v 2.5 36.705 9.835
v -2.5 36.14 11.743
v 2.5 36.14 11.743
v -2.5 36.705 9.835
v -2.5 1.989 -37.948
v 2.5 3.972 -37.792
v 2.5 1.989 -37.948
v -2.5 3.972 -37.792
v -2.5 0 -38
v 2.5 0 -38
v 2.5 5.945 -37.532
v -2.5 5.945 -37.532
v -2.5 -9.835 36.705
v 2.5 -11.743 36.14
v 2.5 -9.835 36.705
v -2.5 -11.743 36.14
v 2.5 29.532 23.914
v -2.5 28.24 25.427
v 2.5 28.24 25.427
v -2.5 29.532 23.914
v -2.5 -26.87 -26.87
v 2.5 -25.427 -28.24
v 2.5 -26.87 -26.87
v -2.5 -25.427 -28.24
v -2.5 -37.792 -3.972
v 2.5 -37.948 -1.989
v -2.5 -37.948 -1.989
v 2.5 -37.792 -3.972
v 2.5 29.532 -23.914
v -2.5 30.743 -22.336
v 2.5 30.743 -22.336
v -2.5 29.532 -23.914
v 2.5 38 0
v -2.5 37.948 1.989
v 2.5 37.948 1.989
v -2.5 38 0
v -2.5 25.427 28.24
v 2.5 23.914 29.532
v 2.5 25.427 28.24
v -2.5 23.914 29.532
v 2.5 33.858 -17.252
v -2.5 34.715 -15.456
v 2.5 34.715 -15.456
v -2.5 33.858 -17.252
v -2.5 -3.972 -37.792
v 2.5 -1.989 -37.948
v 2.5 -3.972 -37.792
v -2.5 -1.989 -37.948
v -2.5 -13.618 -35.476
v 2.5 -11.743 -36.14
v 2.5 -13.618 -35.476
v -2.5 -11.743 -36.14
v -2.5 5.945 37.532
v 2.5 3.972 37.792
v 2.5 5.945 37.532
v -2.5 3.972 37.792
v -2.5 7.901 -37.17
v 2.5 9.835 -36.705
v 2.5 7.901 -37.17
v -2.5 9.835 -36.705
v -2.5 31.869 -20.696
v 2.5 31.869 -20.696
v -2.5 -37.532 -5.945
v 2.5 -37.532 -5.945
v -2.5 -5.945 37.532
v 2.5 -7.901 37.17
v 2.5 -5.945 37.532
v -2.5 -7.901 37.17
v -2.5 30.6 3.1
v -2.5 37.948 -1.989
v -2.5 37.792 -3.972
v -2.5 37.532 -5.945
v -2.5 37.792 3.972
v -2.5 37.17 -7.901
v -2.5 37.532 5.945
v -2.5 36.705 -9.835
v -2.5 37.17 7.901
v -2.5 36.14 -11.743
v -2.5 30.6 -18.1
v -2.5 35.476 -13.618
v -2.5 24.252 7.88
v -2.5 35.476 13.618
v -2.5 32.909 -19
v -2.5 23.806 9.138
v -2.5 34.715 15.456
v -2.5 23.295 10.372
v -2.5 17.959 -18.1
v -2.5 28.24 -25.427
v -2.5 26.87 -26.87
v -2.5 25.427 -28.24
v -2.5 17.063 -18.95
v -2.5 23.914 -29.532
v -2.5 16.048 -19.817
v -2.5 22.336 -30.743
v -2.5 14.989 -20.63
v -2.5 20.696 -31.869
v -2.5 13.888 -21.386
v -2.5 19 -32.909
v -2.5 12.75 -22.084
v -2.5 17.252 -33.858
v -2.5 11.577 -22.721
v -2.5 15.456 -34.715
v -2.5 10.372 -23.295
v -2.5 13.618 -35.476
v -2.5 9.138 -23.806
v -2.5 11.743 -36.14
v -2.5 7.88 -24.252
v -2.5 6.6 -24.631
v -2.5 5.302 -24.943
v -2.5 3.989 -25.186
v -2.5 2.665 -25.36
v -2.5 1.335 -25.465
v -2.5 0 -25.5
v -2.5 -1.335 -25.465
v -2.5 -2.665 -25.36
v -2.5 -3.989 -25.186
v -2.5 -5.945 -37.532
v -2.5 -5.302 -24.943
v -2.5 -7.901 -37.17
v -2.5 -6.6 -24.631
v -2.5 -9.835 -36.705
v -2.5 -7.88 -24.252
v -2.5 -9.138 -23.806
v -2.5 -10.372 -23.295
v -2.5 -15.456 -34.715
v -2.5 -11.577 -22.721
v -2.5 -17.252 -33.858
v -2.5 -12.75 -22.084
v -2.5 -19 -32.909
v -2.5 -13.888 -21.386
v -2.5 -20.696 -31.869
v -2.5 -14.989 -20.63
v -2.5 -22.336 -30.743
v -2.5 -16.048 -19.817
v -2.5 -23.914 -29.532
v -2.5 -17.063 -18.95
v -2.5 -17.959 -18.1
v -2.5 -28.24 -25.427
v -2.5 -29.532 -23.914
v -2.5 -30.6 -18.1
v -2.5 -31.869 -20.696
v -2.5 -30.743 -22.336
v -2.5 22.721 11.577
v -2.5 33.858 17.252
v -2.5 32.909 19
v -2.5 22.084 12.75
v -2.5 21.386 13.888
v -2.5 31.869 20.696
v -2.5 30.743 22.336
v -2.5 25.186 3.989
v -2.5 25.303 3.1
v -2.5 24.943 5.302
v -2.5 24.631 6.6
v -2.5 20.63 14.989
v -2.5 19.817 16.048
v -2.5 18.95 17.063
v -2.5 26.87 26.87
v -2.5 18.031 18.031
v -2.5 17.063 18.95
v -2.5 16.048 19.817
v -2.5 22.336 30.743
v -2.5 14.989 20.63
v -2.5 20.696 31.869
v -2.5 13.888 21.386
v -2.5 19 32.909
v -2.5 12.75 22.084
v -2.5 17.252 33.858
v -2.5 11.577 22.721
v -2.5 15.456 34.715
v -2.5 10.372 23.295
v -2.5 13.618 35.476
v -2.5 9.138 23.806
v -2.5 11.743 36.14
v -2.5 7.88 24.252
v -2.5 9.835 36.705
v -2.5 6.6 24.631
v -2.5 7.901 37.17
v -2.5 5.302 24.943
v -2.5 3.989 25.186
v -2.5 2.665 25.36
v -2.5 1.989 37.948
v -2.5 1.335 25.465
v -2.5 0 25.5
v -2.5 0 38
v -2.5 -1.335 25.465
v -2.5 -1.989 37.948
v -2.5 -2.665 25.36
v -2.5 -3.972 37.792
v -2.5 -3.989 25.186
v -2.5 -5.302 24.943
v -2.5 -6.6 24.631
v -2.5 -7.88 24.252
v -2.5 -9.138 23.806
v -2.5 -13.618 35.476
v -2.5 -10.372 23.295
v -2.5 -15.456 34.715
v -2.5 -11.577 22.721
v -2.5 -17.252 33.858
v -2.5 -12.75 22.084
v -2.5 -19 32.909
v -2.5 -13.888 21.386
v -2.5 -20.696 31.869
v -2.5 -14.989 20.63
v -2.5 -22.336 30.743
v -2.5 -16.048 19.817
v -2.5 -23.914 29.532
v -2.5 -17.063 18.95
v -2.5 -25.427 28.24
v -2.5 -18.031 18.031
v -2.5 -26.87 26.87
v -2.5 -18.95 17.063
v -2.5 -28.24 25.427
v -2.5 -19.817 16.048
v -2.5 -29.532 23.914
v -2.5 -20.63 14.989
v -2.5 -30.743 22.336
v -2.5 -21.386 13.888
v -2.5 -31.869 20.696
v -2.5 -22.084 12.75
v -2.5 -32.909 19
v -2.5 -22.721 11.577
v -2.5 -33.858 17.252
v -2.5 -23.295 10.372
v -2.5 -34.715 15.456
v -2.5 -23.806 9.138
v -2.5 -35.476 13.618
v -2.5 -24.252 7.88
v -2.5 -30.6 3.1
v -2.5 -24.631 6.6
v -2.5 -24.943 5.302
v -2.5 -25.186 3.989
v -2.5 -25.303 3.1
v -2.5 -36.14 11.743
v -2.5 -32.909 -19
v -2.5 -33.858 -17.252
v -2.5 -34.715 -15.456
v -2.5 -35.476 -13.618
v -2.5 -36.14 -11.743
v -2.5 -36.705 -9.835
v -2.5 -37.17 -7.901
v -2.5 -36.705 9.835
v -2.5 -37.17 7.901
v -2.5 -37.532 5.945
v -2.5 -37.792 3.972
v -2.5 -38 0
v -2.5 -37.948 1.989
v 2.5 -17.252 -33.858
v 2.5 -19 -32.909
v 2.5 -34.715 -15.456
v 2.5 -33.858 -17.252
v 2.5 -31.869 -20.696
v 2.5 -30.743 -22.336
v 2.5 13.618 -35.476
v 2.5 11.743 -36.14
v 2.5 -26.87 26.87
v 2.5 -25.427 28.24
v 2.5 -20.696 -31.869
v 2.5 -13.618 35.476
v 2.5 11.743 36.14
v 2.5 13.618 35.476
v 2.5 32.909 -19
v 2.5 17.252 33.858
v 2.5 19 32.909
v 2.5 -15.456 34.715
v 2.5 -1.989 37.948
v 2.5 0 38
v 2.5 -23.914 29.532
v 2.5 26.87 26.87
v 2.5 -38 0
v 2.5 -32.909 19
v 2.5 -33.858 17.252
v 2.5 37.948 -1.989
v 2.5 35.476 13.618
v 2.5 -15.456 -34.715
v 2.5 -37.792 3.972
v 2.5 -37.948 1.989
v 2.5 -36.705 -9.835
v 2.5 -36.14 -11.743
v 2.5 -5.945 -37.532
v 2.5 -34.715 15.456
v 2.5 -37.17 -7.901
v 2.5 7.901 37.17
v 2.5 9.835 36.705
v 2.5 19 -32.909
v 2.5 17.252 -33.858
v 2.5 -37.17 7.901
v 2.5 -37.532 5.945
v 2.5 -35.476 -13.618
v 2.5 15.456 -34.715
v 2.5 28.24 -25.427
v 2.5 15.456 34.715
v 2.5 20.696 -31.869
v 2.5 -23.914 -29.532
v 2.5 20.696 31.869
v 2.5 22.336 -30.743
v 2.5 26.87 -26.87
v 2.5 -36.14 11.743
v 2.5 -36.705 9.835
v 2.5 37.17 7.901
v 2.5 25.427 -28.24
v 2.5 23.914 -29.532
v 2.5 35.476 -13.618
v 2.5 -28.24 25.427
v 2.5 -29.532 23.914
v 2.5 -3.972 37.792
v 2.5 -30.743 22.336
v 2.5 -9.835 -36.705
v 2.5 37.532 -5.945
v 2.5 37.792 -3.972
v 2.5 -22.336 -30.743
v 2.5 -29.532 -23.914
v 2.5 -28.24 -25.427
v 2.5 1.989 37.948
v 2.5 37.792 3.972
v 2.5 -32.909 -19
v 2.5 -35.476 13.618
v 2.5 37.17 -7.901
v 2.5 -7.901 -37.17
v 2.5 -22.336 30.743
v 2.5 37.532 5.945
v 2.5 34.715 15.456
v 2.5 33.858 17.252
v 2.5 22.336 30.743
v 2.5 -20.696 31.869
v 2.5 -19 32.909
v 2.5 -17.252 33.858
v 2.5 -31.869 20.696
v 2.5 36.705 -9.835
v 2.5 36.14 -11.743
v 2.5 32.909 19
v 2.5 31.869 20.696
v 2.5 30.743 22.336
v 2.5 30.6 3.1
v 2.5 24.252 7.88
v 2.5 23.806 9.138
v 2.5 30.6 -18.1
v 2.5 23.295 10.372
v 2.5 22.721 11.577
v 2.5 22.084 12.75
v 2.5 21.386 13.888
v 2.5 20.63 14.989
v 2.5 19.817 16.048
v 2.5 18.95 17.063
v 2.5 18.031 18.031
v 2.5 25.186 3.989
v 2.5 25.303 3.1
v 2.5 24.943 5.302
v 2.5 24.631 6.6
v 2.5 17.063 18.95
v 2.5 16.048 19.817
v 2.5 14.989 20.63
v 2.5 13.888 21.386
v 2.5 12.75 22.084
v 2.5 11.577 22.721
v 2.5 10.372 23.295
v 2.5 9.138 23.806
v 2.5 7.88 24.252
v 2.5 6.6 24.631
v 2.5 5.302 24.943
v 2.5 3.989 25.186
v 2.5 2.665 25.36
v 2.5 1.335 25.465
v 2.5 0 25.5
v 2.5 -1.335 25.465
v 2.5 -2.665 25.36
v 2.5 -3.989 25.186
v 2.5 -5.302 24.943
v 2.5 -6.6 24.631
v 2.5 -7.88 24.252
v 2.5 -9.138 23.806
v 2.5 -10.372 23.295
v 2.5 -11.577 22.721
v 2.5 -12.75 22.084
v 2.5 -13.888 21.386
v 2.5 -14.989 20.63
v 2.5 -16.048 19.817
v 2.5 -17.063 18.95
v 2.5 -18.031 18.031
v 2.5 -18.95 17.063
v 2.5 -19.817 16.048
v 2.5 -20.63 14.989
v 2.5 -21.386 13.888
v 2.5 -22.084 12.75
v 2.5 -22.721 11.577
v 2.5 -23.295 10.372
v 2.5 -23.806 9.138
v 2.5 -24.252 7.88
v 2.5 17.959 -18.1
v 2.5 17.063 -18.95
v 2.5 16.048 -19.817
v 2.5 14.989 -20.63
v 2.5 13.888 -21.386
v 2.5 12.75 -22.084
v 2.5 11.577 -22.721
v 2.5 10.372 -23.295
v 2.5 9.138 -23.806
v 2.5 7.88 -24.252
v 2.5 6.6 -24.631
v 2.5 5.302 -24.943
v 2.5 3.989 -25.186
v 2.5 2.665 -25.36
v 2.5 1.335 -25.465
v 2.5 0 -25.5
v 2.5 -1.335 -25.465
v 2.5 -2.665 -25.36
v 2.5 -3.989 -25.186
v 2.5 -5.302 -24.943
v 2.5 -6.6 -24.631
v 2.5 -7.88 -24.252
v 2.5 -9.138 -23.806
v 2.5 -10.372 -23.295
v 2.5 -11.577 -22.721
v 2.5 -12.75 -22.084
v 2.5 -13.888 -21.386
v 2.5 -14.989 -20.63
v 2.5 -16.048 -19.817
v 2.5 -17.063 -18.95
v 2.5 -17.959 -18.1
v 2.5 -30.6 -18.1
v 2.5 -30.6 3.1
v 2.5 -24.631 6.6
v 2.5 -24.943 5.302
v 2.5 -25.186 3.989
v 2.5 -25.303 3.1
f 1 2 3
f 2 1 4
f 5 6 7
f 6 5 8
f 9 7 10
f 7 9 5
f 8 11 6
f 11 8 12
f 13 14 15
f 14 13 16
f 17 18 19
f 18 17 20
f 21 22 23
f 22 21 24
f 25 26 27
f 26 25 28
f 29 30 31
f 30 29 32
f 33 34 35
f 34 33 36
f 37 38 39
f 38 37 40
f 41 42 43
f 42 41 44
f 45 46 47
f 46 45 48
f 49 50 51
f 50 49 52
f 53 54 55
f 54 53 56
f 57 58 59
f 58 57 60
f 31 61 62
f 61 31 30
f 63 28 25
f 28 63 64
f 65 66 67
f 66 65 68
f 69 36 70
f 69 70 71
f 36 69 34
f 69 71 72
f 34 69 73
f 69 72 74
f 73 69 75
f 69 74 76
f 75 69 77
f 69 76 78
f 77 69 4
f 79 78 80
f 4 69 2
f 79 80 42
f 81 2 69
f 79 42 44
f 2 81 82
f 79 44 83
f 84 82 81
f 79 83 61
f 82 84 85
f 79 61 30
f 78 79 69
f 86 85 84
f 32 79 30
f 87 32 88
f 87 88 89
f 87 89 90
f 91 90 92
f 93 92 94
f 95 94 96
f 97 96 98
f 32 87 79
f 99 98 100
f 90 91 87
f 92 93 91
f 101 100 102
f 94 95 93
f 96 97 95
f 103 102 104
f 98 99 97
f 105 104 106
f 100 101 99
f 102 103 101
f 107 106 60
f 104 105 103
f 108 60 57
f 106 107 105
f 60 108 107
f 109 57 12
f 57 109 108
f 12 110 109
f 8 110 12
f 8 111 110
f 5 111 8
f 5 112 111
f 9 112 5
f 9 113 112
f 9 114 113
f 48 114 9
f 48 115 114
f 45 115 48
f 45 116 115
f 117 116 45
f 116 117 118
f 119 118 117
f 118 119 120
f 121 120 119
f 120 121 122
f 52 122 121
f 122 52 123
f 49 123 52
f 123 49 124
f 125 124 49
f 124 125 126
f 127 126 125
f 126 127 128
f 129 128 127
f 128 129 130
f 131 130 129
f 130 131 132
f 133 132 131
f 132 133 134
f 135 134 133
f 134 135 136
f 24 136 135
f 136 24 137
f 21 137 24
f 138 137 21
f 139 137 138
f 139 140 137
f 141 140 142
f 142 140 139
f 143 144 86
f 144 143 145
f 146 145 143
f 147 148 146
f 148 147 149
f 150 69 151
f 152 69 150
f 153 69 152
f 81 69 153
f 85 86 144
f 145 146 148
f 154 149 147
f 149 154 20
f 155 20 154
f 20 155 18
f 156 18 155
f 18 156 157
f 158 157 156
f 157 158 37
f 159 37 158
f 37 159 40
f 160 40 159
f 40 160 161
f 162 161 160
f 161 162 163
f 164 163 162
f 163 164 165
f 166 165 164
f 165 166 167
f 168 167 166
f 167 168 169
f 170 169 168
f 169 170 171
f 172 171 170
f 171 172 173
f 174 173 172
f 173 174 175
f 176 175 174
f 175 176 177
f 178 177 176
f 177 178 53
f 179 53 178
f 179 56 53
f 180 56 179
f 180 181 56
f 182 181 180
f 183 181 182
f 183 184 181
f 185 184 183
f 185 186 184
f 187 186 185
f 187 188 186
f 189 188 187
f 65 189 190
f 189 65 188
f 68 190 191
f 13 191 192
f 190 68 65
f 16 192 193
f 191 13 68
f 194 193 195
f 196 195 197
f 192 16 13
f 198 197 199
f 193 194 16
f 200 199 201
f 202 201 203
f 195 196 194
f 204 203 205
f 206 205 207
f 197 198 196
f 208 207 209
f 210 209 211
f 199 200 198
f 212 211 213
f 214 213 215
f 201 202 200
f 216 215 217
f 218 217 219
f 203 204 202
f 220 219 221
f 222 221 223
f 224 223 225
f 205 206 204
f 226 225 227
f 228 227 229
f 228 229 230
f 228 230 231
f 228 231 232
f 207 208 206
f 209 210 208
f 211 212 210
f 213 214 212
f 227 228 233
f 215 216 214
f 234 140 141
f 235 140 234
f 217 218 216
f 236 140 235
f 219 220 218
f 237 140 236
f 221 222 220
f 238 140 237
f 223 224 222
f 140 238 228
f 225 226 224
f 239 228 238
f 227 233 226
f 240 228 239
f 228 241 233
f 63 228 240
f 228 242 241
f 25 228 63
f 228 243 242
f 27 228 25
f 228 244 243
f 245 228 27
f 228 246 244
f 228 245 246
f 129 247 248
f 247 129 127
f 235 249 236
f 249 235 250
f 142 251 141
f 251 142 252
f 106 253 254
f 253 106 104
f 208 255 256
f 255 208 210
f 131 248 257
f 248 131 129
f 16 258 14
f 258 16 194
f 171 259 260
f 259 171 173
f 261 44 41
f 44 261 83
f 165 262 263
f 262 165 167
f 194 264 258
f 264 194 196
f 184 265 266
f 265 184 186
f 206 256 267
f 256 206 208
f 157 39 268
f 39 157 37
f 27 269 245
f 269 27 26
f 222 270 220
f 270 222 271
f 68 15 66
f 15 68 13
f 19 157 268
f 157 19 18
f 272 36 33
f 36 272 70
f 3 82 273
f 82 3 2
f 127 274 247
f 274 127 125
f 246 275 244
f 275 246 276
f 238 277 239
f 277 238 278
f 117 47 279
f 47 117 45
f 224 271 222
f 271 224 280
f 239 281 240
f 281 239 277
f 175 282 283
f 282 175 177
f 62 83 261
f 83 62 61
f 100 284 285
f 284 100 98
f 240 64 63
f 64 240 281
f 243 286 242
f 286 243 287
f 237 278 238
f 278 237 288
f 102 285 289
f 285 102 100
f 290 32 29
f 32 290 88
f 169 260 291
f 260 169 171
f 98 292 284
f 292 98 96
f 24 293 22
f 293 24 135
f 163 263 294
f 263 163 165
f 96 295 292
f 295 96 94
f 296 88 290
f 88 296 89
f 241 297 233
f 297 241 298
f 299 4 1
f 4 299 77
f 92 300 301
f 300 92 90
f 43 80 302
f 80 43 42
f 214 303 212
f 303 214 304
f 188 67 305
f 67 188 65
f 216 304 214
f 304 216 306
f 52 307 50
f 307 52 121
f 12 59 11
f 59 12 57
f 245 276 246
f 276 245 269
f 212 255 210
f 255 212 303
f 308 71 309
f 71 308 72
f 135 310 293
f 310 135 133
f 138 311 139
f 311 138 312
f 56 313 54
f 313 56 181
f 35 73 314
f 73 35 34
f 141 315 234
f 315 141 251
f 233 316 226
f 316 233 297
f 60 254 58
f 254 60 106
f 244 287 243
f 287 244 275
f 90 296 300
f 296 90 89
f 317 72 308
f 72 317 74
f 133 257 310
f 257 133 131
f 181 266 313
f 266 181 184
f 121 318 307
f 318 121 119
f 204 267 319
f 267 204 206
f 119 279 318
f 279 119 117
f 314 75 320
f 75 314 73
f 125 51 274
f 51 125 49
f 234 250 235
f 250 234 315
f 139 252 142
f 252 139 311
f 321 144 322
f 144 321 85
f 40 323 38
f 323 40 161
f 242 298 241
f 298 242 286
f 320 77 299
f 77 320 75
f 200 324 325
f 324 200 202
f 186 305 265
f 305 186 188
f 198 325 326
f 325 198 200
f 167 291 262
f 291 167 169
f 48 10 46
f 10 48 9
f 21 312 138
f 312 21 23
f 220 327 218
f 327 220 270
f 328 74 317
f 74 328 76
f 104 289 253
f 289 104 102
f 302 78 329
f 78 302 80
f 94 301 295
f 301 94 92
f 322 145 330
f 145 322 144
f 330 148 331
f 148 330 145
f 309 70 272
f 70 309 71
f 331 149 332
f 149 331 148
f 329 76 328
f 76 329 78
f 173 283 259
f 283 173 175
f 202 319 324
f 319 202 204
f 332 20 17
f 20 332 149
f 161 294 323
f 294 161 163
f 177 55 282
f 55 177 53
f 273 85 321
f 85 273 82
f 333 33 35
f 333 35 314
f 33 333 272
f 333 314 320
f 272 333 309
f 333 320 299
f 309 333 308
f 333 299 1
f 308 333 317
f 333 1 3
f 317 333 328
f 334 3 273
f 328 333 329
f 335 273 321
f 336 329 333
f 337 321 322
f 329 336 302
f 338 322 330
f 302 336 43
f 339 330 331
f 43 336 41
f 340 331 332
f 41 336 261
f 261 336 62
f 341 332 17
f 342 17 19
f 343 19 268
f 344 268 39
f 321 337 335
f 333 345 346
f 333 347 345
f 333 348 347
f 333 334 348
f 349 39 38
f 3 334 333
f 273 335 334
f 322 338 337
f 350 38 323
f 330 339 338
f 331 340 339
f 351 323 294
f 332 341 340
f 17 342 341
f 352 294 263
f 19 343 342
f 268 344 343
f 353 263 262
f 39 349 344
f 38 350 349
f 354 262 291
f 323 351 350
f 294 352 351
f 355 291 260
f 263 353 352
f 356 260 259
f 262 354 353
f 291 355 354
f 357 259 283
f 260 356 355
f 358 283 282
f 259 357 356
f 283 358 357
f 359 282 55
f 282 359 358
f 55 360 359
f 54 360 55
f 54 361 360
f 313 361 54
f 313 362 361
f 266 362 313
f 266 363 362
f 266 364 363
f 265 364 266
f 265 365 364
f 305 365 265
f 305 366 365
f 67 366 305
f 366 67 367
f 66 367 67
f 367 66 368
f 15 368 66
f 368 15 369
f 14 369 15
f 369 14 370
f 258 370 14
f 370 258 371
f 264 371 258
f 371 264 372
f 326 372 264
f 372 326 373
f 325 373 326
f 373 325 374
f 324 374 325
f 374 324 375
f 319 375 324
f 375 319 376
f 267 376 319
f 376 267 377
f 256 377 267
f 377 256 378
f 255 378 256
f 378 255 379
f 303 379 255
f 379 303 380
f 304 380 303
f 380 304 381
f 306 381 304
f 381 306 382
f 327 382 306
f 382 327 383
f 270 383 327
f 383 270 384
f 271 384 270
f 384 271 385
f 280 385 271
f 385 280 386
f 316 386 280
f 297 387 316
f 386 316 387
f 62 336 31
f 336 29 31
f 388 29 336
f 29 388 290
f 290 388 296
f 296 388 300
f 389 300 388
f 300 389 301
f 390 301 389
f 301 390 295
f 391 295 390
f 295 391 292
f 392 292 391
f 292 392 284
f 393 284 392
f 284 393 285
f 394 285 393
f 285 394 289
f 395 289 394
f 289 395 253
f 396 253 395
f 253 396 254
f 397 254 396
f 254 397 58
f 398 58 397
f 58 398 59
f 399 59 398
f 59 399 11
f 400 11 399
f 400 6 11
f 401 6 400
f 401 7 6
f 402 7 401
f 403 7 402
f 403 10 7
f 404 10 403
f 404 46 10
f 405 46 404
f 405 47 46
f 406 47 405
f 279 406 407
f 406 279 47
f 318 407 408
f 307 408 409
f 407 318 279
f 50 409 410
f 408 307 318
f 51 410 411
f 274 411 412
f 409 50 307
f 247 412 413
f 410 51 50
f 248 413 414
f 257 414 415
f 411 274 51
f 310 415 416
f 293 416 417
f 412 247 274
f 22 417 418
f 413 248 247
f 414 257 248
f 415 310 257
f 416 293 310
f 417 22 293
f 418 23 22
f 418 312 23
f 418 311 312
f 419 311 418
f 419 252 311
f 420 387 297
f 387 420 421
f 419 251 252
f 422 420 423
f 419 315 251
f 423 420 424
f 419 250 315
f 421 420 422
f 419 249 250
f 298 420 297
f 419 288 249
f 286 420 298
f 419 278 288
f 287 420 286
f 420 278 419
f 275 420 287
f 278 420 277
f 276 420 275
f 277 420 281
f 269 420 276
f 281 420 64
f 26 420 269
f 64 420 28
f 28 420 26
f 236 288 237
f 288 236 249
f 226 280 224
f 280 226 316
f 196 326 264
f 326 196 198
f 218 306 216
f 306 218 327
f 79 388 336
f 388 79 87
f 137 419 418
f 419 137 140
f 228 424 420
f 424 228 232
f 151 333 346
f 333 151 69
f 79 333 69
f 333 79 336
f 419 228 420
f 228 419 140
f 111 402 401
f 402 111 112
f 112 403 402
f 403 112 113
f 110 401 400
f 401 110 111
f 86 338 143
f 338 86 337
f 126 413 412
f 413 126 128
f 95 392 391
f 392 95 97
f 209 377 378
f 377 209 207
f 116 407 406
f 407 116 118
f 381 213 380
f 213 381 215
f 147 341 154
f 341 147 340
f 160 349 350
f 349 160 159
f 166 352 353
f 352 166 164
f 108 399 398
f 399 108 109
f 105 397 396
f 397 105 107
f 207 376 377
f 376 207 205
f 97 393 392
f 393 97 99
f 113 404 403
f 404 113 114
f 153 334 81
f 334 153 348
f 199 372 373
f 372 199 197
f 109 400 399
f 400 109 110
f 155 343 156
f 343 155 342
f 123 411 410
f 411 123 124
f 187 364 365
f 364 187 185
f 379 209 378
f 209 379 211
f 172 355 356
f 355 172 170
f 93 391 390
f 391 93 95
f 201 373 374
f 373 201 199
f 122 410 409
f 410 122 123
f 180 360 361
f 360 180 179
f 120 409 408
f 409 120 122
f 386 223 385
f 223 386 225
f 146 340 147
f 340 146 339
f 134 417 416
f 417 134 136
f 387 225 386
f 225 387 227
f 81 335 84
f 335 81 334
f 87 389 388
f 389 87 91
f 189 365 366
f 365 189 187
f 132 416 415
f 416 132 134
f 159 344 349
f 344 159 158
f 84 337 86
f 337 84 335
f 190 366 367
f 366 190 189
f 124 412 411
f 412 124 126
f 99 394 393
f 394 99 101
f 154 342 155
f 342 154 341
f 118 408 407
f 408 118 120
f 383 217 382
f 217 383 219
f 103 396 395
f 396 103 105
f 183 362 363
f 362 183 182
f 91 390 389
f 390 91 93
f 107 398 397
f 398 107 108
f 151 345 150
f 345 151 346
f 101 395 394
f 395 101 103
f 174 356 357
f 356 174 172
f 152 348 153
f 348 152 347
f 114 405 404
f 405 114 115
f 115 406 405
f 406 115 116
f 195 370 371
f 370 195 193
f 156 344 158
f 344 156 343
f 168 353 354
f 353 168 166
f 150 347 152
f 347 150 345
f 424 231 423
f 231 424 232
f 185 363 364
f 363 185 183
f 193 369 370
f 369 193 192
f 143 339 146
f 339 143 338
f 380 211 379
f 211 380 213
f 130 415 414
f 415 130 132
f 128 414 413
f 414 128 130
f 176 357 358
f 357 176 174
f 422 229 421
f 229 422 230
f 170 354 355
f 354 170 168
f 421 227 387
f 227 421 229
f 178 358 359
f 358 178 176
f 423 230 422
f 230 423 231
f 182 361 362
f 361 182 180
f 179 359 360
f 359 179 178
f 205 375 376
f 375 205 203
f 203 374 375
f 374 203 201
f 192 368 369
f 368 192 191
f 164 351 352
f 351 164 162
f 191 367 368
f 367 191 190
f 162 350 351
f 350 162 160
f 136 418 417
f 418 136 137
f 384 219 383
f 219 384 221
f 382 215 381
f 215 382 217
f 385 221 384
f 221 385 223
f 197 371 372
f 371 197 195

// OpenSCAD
// file: config.scad
// Configuració general

// Cos principal
height_cyli = 298;
wall_width = 6.35;
inner_diameter = 76;
diameter_cyli = inner_diameter + wall_width*2;

// Bateria LIPO
w1 = 47;
h1 = 26;

// Bateria Raspi
w2 = 61;
h2 = 21;
// main file
include <config.scad>
$fa = 3;
$fs = 0.3;

thickness = 5;

module suport_bater(thickness=5, diameter=76, h=21, w=61){
rotate([0,90,0])
difference() {
cylinder(h=thickness, d=diameter, center=true);

// Bateria raspy
translate([h2/2-3,0,0])
color("#00c5ff") cube([h+0.2,w+0.2,thickness+0.5],center=true);

cylinder(h=thickness+0.3, d=diameter-25, center=true);

}}

suport_bater(thickness=thickness, diameter=inner_diameter, h=h2, w=w2);
